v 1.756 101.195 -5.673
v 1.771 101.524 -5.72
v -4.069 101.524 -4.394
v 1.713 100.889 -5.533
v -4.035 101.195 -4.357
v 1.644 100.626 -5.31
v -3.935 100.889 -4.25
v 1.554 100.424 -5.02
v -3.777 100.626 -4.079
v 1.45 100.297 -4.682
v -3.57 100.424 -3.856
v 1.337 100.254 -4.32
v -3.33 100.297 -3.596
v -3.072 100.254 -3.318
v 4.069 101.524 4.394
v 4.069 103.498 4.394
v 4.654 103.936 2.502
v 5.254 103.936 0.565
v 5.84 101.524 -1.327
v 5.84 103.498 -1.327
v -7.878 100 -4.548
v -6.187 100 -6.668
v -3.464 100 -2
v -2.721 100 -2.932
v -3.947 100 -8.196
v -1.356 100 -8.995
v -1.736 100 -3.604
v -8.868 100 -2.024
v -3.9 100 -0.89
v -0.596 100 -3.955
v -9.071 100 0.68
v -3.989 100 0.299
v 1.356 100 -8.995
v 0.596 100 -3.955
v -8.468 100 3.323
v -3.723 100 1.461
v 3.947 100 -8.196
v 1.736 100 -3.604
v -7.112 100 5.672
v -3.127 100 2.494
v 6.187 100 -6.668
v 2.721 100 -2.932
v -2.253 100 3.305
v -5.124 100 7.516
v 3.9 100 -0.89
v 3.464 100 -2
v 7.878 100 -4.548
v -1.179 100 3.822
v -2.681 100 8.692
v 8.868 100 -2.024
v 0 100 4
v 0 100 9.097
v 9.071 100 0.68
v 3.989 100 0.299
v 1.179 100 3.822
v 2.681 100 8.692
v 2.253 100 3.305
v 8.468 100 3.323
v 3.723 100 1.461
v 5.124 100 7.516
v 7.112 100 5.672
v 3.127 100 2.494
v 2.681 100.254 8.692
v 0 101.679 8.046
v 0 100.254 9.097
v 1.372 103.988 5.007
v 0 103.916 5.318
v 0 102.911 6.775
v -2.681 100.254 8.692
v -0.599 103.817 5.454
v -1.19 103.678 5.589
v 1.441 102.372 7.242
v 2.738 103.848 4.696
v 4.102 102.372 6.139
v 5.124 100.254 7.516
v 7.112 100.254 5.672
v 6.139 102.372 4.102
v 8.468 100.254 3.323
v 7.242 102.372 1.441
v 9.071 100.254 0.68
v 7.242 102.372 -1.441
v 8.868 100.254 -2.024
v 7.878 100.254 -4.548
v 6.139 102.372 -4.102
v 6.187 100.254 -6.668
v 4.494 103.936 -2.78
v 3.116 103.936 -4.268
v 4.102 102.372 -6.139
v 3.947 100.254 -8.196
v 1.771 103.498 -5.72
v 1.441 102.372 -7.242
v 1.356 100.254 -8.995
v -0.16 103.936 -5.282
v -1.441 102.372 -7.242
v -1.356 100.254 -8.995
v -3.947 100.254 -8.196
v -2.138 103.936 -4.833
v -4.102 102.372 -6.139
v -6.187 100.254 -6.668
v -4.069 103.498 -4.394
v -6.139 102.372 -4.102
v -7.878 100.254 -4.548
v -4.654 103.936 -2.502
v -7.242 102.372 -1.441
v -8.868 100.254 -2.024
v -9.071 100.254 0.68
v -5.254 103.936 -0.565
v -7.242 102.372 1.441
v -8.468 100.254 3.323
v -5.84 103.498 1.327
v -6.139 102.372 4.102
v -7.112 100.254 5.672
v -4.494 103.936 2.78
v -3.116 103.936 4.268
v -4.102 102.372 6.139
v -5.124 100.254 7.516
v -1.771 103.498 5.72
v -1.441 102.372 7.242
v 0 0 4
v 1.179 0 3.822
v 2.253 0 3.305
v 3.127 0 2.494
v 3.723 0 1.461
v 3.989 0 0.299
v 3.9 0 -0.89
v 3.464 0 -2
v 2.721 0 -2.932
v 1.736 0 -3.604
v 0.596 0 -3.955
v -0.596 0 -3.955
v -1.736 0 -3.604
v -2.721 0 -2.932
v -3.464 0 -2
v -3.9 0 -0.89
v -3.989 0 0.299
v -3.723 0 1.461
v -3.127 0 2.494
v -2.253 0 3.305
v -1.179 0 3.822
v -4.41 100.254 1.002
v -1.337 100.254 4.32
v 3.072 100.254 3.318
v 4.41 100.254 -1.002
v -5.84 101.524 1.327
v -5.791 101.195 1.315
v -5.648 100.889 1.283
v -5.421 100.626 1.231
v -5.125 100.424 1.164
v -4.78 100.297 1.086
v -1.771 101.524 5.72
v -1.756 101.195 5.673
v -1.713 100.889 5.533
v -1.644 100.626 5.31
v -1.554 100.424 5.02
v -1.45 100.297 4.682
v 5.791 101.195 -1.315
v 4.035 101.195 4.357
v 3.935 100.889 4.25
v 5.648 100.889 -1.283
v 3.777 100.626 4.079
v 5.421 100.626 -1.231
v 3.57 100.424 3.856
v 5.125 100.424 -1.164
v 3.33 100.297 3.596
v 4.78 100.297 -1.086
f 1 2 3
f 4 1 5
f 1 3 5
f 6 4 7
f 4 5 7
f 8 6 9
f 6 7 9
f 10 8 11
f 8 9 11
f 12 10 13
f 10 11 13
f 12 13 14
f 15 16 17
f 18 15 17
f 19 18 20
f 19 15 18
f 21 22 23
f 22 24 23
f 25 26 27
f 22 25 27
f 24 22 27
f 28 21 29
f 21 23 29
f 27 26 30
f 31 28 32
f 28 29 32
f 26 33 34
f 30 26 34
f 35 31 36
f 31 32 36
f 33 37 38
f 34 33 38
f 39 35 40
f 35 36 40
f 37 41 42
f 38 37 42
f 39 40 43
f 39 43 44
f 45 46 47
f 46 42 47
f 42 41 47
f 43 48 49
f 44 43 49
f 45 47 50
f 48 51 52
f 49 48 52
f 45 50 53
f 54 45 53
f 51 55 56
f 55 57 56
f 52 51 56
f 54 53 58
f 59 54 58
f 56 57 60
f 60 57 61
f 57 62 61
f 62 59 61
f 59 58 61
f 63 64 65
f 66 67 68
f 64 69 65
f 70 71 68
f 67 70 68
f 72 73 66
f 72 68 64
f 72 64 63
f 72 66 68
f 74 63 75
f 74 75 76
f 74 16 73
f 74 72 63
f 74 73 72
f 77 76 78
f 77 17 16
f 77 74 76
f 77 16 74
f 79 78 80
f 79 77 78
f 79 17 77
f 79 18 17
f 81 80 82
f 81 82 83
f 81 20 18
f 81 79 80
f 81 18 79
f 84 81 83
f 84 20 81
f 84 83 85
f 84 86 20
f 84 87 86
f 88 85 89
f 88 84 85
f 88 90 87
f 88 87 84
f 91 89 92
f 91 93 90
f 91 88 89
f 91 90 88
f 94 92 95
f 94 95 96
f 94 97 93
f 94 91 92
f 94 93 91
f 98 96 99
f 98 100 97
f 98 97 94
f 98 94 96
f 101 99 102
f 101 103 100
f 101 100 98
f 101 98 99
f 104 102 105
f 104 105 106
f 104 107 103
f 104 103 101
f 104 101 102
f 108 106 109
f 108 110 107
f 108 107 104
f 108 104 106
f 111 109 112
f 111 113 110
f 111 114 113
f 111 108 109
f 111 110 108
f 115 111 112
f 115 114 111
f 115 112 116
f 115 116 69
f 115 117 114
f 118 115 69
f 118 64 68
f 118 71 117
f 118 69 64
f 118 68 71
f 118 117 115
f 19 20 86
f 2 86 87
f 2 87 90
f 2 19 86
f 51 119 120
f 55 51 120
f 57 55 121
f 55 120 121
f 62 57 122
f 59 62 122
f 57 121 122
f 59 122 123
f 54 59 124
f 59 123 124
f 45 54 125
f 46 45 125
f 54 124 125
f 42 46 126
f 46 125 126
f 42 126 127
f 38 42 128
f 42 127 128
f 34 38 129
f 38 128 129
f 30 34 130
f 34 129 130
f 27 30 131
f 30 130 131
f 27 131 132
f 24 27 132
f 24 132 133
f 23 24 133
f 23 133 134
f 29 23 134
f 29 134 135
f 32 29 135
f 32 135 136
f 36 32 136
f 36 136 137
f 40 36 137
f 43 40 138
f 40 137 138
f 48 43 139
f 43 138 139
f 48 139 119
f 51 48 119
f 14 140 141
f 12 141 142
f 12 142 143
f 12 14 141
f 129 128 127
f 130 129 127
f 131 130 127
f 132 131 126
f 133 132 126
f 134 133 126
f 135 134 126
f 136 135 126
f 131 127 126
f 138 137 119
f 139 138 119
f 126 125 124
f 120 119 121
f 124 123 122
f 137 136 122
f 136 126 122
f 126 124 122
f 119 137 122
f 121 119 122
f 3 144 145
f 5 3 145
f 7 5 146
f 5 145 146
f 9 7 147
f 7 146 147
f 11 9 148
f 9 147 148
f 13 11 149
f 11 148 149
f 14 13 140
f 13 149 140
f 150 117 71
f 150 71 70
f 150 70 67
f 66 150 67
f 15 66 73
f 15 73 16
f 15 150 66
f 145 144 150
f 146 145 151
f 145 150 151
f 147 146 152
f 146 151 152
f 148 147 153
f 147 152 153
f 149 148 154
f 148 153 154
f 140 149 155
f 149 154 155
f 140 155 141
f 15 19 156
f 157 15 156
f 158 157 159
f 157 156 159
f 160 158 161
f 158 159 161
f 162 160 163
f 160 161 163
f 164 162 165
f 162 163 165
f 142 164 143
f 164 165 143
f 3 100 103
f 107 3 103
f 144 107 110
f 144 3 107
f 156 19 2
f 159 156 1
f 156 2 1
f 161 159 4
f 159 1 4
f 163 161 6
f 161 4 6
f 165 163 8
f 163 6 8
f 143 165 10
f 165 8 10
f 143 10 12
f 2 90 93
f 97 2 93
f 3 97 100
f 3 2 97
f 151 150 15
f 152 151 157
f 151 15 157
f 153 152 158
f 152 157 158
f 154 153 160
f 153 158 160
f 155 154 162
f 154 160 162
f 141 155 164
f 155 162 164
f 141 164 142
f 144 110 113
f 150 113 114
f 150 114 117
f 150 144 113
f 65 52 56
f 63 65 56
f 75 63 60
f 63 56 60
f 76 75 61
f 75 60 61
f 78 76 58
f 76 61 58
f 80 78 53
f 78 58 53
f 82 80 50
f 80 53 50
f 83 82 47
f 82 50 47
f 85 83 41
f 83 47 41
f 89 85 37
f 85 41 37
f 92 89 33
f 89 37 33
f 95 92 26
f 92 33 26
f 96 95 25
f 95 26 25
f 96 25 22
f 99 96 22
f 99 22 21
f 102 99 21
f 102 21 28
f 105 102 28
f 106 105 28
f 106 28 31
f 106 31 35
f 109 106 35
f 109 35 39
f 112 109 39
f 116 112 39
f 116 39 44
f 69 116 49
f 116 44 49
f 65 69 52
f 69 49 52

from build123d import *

# Parameters (mm, degrees)
SKETCH1_R           = 4
BOSS_EXTRUDE1_DEPTH = 100
SKETCH2_R           = 9.096563294
BOSS_EXTRUDE2_DEPTH = 0.254
DOME1_FACE_RADIUS   = 9.096563294
DOME1_HEIGHT        = 5.08
CUT_EXTRUDE1_DEPTH  = 102.076008249
FILLET1_R           = 1.27


with BuildPart() as part:
    # Sketch1 → Boss-Extrude1 (new body)
    with BuildSketch(Plane(origin=(0, 0, 0), x_dir=(1, 0, 0), z_dir=(0, 1, 0))):
        with Locations(Location((0, 0, 0), (0, 0, 270))):
            Circle(SKETCH1_R)
    extrude(amount=BOSS_EXTRUDE1_DEPTH)

    # Sketch2 → Boss-Extrude2 (add)
    with BuildSketch(Plane(origin=(0, 100, 0), x_dir=(1, 0, 0), z_dir=(0, 1, 0))):
        with Locations(Location((0, 0, 0), (0, 0, 270))):
            Circle(SKETCH2_R)
    extrude(amount=BOSS_EXTRUDE2_DEPTH)

    # Dome1: a dome of height H over a round flat face of radius A is a cap of a sphere of radius (A * A + H * H) / (2 * H)
    dome1_r = (DOME1_FACE_RADIUS * DOME1_FACE_RADIUS + DOME1_HEIGHT * DOME1_HEIGHT) / (2 * DOME1_HEIGHT)
    dome1_base = Plane((0, 100.254, 0), z_dir=(0, 1, 0))
    with Locations(dome1_base.offset(DOME1_HEIGHT - dome1_r)):
        dome1_ball = Sphere(dome1_r, mode=Mode.PRIVATE)
    add(split(dome1_ball, bisect_by=dome1_base, keep=Keep.TOP, mode=Mode.PRIVATE))

    # Sketch3 → Cut-Extrude1 (cut, through all)
    with BuildSketch(Plane(origin=(0, 100.254, 0), x_dir=(1, 0, 0), z_dir=(0, 1, 0))):
        Polygon((1.770969394, 5.720489675), (-4.068604684, 4.393949322), (-5.839574078, -1.326540353), (-1.770969394, -5.720489675), (4.068604684, -4.393949322), (5.839574078, 1.326540353), align=None)
    extrude(amount=CUT_EXTRUDE1_DEPTH, mode=Mode.SUBTRACT)

    # Fillet1
    fillet1_edges = [part.edges().sort_by_distance(p)[0] for p in [
        (-4.954089381, 100.254, -1.533704485),
        (-3.805271736, 100.254, 3.523515014),
        (1.148817645, 100.254, 5.057219499),
        (4.954089381, 100.254, 1.533704485),
        (3.805271736, 100.254, -3.523515014),
        (-1.148817645, 100.254, -5.057219499),
    ]]
    fillet(fillet1_edges, radius=FILLET1_R)


solid = part.part
